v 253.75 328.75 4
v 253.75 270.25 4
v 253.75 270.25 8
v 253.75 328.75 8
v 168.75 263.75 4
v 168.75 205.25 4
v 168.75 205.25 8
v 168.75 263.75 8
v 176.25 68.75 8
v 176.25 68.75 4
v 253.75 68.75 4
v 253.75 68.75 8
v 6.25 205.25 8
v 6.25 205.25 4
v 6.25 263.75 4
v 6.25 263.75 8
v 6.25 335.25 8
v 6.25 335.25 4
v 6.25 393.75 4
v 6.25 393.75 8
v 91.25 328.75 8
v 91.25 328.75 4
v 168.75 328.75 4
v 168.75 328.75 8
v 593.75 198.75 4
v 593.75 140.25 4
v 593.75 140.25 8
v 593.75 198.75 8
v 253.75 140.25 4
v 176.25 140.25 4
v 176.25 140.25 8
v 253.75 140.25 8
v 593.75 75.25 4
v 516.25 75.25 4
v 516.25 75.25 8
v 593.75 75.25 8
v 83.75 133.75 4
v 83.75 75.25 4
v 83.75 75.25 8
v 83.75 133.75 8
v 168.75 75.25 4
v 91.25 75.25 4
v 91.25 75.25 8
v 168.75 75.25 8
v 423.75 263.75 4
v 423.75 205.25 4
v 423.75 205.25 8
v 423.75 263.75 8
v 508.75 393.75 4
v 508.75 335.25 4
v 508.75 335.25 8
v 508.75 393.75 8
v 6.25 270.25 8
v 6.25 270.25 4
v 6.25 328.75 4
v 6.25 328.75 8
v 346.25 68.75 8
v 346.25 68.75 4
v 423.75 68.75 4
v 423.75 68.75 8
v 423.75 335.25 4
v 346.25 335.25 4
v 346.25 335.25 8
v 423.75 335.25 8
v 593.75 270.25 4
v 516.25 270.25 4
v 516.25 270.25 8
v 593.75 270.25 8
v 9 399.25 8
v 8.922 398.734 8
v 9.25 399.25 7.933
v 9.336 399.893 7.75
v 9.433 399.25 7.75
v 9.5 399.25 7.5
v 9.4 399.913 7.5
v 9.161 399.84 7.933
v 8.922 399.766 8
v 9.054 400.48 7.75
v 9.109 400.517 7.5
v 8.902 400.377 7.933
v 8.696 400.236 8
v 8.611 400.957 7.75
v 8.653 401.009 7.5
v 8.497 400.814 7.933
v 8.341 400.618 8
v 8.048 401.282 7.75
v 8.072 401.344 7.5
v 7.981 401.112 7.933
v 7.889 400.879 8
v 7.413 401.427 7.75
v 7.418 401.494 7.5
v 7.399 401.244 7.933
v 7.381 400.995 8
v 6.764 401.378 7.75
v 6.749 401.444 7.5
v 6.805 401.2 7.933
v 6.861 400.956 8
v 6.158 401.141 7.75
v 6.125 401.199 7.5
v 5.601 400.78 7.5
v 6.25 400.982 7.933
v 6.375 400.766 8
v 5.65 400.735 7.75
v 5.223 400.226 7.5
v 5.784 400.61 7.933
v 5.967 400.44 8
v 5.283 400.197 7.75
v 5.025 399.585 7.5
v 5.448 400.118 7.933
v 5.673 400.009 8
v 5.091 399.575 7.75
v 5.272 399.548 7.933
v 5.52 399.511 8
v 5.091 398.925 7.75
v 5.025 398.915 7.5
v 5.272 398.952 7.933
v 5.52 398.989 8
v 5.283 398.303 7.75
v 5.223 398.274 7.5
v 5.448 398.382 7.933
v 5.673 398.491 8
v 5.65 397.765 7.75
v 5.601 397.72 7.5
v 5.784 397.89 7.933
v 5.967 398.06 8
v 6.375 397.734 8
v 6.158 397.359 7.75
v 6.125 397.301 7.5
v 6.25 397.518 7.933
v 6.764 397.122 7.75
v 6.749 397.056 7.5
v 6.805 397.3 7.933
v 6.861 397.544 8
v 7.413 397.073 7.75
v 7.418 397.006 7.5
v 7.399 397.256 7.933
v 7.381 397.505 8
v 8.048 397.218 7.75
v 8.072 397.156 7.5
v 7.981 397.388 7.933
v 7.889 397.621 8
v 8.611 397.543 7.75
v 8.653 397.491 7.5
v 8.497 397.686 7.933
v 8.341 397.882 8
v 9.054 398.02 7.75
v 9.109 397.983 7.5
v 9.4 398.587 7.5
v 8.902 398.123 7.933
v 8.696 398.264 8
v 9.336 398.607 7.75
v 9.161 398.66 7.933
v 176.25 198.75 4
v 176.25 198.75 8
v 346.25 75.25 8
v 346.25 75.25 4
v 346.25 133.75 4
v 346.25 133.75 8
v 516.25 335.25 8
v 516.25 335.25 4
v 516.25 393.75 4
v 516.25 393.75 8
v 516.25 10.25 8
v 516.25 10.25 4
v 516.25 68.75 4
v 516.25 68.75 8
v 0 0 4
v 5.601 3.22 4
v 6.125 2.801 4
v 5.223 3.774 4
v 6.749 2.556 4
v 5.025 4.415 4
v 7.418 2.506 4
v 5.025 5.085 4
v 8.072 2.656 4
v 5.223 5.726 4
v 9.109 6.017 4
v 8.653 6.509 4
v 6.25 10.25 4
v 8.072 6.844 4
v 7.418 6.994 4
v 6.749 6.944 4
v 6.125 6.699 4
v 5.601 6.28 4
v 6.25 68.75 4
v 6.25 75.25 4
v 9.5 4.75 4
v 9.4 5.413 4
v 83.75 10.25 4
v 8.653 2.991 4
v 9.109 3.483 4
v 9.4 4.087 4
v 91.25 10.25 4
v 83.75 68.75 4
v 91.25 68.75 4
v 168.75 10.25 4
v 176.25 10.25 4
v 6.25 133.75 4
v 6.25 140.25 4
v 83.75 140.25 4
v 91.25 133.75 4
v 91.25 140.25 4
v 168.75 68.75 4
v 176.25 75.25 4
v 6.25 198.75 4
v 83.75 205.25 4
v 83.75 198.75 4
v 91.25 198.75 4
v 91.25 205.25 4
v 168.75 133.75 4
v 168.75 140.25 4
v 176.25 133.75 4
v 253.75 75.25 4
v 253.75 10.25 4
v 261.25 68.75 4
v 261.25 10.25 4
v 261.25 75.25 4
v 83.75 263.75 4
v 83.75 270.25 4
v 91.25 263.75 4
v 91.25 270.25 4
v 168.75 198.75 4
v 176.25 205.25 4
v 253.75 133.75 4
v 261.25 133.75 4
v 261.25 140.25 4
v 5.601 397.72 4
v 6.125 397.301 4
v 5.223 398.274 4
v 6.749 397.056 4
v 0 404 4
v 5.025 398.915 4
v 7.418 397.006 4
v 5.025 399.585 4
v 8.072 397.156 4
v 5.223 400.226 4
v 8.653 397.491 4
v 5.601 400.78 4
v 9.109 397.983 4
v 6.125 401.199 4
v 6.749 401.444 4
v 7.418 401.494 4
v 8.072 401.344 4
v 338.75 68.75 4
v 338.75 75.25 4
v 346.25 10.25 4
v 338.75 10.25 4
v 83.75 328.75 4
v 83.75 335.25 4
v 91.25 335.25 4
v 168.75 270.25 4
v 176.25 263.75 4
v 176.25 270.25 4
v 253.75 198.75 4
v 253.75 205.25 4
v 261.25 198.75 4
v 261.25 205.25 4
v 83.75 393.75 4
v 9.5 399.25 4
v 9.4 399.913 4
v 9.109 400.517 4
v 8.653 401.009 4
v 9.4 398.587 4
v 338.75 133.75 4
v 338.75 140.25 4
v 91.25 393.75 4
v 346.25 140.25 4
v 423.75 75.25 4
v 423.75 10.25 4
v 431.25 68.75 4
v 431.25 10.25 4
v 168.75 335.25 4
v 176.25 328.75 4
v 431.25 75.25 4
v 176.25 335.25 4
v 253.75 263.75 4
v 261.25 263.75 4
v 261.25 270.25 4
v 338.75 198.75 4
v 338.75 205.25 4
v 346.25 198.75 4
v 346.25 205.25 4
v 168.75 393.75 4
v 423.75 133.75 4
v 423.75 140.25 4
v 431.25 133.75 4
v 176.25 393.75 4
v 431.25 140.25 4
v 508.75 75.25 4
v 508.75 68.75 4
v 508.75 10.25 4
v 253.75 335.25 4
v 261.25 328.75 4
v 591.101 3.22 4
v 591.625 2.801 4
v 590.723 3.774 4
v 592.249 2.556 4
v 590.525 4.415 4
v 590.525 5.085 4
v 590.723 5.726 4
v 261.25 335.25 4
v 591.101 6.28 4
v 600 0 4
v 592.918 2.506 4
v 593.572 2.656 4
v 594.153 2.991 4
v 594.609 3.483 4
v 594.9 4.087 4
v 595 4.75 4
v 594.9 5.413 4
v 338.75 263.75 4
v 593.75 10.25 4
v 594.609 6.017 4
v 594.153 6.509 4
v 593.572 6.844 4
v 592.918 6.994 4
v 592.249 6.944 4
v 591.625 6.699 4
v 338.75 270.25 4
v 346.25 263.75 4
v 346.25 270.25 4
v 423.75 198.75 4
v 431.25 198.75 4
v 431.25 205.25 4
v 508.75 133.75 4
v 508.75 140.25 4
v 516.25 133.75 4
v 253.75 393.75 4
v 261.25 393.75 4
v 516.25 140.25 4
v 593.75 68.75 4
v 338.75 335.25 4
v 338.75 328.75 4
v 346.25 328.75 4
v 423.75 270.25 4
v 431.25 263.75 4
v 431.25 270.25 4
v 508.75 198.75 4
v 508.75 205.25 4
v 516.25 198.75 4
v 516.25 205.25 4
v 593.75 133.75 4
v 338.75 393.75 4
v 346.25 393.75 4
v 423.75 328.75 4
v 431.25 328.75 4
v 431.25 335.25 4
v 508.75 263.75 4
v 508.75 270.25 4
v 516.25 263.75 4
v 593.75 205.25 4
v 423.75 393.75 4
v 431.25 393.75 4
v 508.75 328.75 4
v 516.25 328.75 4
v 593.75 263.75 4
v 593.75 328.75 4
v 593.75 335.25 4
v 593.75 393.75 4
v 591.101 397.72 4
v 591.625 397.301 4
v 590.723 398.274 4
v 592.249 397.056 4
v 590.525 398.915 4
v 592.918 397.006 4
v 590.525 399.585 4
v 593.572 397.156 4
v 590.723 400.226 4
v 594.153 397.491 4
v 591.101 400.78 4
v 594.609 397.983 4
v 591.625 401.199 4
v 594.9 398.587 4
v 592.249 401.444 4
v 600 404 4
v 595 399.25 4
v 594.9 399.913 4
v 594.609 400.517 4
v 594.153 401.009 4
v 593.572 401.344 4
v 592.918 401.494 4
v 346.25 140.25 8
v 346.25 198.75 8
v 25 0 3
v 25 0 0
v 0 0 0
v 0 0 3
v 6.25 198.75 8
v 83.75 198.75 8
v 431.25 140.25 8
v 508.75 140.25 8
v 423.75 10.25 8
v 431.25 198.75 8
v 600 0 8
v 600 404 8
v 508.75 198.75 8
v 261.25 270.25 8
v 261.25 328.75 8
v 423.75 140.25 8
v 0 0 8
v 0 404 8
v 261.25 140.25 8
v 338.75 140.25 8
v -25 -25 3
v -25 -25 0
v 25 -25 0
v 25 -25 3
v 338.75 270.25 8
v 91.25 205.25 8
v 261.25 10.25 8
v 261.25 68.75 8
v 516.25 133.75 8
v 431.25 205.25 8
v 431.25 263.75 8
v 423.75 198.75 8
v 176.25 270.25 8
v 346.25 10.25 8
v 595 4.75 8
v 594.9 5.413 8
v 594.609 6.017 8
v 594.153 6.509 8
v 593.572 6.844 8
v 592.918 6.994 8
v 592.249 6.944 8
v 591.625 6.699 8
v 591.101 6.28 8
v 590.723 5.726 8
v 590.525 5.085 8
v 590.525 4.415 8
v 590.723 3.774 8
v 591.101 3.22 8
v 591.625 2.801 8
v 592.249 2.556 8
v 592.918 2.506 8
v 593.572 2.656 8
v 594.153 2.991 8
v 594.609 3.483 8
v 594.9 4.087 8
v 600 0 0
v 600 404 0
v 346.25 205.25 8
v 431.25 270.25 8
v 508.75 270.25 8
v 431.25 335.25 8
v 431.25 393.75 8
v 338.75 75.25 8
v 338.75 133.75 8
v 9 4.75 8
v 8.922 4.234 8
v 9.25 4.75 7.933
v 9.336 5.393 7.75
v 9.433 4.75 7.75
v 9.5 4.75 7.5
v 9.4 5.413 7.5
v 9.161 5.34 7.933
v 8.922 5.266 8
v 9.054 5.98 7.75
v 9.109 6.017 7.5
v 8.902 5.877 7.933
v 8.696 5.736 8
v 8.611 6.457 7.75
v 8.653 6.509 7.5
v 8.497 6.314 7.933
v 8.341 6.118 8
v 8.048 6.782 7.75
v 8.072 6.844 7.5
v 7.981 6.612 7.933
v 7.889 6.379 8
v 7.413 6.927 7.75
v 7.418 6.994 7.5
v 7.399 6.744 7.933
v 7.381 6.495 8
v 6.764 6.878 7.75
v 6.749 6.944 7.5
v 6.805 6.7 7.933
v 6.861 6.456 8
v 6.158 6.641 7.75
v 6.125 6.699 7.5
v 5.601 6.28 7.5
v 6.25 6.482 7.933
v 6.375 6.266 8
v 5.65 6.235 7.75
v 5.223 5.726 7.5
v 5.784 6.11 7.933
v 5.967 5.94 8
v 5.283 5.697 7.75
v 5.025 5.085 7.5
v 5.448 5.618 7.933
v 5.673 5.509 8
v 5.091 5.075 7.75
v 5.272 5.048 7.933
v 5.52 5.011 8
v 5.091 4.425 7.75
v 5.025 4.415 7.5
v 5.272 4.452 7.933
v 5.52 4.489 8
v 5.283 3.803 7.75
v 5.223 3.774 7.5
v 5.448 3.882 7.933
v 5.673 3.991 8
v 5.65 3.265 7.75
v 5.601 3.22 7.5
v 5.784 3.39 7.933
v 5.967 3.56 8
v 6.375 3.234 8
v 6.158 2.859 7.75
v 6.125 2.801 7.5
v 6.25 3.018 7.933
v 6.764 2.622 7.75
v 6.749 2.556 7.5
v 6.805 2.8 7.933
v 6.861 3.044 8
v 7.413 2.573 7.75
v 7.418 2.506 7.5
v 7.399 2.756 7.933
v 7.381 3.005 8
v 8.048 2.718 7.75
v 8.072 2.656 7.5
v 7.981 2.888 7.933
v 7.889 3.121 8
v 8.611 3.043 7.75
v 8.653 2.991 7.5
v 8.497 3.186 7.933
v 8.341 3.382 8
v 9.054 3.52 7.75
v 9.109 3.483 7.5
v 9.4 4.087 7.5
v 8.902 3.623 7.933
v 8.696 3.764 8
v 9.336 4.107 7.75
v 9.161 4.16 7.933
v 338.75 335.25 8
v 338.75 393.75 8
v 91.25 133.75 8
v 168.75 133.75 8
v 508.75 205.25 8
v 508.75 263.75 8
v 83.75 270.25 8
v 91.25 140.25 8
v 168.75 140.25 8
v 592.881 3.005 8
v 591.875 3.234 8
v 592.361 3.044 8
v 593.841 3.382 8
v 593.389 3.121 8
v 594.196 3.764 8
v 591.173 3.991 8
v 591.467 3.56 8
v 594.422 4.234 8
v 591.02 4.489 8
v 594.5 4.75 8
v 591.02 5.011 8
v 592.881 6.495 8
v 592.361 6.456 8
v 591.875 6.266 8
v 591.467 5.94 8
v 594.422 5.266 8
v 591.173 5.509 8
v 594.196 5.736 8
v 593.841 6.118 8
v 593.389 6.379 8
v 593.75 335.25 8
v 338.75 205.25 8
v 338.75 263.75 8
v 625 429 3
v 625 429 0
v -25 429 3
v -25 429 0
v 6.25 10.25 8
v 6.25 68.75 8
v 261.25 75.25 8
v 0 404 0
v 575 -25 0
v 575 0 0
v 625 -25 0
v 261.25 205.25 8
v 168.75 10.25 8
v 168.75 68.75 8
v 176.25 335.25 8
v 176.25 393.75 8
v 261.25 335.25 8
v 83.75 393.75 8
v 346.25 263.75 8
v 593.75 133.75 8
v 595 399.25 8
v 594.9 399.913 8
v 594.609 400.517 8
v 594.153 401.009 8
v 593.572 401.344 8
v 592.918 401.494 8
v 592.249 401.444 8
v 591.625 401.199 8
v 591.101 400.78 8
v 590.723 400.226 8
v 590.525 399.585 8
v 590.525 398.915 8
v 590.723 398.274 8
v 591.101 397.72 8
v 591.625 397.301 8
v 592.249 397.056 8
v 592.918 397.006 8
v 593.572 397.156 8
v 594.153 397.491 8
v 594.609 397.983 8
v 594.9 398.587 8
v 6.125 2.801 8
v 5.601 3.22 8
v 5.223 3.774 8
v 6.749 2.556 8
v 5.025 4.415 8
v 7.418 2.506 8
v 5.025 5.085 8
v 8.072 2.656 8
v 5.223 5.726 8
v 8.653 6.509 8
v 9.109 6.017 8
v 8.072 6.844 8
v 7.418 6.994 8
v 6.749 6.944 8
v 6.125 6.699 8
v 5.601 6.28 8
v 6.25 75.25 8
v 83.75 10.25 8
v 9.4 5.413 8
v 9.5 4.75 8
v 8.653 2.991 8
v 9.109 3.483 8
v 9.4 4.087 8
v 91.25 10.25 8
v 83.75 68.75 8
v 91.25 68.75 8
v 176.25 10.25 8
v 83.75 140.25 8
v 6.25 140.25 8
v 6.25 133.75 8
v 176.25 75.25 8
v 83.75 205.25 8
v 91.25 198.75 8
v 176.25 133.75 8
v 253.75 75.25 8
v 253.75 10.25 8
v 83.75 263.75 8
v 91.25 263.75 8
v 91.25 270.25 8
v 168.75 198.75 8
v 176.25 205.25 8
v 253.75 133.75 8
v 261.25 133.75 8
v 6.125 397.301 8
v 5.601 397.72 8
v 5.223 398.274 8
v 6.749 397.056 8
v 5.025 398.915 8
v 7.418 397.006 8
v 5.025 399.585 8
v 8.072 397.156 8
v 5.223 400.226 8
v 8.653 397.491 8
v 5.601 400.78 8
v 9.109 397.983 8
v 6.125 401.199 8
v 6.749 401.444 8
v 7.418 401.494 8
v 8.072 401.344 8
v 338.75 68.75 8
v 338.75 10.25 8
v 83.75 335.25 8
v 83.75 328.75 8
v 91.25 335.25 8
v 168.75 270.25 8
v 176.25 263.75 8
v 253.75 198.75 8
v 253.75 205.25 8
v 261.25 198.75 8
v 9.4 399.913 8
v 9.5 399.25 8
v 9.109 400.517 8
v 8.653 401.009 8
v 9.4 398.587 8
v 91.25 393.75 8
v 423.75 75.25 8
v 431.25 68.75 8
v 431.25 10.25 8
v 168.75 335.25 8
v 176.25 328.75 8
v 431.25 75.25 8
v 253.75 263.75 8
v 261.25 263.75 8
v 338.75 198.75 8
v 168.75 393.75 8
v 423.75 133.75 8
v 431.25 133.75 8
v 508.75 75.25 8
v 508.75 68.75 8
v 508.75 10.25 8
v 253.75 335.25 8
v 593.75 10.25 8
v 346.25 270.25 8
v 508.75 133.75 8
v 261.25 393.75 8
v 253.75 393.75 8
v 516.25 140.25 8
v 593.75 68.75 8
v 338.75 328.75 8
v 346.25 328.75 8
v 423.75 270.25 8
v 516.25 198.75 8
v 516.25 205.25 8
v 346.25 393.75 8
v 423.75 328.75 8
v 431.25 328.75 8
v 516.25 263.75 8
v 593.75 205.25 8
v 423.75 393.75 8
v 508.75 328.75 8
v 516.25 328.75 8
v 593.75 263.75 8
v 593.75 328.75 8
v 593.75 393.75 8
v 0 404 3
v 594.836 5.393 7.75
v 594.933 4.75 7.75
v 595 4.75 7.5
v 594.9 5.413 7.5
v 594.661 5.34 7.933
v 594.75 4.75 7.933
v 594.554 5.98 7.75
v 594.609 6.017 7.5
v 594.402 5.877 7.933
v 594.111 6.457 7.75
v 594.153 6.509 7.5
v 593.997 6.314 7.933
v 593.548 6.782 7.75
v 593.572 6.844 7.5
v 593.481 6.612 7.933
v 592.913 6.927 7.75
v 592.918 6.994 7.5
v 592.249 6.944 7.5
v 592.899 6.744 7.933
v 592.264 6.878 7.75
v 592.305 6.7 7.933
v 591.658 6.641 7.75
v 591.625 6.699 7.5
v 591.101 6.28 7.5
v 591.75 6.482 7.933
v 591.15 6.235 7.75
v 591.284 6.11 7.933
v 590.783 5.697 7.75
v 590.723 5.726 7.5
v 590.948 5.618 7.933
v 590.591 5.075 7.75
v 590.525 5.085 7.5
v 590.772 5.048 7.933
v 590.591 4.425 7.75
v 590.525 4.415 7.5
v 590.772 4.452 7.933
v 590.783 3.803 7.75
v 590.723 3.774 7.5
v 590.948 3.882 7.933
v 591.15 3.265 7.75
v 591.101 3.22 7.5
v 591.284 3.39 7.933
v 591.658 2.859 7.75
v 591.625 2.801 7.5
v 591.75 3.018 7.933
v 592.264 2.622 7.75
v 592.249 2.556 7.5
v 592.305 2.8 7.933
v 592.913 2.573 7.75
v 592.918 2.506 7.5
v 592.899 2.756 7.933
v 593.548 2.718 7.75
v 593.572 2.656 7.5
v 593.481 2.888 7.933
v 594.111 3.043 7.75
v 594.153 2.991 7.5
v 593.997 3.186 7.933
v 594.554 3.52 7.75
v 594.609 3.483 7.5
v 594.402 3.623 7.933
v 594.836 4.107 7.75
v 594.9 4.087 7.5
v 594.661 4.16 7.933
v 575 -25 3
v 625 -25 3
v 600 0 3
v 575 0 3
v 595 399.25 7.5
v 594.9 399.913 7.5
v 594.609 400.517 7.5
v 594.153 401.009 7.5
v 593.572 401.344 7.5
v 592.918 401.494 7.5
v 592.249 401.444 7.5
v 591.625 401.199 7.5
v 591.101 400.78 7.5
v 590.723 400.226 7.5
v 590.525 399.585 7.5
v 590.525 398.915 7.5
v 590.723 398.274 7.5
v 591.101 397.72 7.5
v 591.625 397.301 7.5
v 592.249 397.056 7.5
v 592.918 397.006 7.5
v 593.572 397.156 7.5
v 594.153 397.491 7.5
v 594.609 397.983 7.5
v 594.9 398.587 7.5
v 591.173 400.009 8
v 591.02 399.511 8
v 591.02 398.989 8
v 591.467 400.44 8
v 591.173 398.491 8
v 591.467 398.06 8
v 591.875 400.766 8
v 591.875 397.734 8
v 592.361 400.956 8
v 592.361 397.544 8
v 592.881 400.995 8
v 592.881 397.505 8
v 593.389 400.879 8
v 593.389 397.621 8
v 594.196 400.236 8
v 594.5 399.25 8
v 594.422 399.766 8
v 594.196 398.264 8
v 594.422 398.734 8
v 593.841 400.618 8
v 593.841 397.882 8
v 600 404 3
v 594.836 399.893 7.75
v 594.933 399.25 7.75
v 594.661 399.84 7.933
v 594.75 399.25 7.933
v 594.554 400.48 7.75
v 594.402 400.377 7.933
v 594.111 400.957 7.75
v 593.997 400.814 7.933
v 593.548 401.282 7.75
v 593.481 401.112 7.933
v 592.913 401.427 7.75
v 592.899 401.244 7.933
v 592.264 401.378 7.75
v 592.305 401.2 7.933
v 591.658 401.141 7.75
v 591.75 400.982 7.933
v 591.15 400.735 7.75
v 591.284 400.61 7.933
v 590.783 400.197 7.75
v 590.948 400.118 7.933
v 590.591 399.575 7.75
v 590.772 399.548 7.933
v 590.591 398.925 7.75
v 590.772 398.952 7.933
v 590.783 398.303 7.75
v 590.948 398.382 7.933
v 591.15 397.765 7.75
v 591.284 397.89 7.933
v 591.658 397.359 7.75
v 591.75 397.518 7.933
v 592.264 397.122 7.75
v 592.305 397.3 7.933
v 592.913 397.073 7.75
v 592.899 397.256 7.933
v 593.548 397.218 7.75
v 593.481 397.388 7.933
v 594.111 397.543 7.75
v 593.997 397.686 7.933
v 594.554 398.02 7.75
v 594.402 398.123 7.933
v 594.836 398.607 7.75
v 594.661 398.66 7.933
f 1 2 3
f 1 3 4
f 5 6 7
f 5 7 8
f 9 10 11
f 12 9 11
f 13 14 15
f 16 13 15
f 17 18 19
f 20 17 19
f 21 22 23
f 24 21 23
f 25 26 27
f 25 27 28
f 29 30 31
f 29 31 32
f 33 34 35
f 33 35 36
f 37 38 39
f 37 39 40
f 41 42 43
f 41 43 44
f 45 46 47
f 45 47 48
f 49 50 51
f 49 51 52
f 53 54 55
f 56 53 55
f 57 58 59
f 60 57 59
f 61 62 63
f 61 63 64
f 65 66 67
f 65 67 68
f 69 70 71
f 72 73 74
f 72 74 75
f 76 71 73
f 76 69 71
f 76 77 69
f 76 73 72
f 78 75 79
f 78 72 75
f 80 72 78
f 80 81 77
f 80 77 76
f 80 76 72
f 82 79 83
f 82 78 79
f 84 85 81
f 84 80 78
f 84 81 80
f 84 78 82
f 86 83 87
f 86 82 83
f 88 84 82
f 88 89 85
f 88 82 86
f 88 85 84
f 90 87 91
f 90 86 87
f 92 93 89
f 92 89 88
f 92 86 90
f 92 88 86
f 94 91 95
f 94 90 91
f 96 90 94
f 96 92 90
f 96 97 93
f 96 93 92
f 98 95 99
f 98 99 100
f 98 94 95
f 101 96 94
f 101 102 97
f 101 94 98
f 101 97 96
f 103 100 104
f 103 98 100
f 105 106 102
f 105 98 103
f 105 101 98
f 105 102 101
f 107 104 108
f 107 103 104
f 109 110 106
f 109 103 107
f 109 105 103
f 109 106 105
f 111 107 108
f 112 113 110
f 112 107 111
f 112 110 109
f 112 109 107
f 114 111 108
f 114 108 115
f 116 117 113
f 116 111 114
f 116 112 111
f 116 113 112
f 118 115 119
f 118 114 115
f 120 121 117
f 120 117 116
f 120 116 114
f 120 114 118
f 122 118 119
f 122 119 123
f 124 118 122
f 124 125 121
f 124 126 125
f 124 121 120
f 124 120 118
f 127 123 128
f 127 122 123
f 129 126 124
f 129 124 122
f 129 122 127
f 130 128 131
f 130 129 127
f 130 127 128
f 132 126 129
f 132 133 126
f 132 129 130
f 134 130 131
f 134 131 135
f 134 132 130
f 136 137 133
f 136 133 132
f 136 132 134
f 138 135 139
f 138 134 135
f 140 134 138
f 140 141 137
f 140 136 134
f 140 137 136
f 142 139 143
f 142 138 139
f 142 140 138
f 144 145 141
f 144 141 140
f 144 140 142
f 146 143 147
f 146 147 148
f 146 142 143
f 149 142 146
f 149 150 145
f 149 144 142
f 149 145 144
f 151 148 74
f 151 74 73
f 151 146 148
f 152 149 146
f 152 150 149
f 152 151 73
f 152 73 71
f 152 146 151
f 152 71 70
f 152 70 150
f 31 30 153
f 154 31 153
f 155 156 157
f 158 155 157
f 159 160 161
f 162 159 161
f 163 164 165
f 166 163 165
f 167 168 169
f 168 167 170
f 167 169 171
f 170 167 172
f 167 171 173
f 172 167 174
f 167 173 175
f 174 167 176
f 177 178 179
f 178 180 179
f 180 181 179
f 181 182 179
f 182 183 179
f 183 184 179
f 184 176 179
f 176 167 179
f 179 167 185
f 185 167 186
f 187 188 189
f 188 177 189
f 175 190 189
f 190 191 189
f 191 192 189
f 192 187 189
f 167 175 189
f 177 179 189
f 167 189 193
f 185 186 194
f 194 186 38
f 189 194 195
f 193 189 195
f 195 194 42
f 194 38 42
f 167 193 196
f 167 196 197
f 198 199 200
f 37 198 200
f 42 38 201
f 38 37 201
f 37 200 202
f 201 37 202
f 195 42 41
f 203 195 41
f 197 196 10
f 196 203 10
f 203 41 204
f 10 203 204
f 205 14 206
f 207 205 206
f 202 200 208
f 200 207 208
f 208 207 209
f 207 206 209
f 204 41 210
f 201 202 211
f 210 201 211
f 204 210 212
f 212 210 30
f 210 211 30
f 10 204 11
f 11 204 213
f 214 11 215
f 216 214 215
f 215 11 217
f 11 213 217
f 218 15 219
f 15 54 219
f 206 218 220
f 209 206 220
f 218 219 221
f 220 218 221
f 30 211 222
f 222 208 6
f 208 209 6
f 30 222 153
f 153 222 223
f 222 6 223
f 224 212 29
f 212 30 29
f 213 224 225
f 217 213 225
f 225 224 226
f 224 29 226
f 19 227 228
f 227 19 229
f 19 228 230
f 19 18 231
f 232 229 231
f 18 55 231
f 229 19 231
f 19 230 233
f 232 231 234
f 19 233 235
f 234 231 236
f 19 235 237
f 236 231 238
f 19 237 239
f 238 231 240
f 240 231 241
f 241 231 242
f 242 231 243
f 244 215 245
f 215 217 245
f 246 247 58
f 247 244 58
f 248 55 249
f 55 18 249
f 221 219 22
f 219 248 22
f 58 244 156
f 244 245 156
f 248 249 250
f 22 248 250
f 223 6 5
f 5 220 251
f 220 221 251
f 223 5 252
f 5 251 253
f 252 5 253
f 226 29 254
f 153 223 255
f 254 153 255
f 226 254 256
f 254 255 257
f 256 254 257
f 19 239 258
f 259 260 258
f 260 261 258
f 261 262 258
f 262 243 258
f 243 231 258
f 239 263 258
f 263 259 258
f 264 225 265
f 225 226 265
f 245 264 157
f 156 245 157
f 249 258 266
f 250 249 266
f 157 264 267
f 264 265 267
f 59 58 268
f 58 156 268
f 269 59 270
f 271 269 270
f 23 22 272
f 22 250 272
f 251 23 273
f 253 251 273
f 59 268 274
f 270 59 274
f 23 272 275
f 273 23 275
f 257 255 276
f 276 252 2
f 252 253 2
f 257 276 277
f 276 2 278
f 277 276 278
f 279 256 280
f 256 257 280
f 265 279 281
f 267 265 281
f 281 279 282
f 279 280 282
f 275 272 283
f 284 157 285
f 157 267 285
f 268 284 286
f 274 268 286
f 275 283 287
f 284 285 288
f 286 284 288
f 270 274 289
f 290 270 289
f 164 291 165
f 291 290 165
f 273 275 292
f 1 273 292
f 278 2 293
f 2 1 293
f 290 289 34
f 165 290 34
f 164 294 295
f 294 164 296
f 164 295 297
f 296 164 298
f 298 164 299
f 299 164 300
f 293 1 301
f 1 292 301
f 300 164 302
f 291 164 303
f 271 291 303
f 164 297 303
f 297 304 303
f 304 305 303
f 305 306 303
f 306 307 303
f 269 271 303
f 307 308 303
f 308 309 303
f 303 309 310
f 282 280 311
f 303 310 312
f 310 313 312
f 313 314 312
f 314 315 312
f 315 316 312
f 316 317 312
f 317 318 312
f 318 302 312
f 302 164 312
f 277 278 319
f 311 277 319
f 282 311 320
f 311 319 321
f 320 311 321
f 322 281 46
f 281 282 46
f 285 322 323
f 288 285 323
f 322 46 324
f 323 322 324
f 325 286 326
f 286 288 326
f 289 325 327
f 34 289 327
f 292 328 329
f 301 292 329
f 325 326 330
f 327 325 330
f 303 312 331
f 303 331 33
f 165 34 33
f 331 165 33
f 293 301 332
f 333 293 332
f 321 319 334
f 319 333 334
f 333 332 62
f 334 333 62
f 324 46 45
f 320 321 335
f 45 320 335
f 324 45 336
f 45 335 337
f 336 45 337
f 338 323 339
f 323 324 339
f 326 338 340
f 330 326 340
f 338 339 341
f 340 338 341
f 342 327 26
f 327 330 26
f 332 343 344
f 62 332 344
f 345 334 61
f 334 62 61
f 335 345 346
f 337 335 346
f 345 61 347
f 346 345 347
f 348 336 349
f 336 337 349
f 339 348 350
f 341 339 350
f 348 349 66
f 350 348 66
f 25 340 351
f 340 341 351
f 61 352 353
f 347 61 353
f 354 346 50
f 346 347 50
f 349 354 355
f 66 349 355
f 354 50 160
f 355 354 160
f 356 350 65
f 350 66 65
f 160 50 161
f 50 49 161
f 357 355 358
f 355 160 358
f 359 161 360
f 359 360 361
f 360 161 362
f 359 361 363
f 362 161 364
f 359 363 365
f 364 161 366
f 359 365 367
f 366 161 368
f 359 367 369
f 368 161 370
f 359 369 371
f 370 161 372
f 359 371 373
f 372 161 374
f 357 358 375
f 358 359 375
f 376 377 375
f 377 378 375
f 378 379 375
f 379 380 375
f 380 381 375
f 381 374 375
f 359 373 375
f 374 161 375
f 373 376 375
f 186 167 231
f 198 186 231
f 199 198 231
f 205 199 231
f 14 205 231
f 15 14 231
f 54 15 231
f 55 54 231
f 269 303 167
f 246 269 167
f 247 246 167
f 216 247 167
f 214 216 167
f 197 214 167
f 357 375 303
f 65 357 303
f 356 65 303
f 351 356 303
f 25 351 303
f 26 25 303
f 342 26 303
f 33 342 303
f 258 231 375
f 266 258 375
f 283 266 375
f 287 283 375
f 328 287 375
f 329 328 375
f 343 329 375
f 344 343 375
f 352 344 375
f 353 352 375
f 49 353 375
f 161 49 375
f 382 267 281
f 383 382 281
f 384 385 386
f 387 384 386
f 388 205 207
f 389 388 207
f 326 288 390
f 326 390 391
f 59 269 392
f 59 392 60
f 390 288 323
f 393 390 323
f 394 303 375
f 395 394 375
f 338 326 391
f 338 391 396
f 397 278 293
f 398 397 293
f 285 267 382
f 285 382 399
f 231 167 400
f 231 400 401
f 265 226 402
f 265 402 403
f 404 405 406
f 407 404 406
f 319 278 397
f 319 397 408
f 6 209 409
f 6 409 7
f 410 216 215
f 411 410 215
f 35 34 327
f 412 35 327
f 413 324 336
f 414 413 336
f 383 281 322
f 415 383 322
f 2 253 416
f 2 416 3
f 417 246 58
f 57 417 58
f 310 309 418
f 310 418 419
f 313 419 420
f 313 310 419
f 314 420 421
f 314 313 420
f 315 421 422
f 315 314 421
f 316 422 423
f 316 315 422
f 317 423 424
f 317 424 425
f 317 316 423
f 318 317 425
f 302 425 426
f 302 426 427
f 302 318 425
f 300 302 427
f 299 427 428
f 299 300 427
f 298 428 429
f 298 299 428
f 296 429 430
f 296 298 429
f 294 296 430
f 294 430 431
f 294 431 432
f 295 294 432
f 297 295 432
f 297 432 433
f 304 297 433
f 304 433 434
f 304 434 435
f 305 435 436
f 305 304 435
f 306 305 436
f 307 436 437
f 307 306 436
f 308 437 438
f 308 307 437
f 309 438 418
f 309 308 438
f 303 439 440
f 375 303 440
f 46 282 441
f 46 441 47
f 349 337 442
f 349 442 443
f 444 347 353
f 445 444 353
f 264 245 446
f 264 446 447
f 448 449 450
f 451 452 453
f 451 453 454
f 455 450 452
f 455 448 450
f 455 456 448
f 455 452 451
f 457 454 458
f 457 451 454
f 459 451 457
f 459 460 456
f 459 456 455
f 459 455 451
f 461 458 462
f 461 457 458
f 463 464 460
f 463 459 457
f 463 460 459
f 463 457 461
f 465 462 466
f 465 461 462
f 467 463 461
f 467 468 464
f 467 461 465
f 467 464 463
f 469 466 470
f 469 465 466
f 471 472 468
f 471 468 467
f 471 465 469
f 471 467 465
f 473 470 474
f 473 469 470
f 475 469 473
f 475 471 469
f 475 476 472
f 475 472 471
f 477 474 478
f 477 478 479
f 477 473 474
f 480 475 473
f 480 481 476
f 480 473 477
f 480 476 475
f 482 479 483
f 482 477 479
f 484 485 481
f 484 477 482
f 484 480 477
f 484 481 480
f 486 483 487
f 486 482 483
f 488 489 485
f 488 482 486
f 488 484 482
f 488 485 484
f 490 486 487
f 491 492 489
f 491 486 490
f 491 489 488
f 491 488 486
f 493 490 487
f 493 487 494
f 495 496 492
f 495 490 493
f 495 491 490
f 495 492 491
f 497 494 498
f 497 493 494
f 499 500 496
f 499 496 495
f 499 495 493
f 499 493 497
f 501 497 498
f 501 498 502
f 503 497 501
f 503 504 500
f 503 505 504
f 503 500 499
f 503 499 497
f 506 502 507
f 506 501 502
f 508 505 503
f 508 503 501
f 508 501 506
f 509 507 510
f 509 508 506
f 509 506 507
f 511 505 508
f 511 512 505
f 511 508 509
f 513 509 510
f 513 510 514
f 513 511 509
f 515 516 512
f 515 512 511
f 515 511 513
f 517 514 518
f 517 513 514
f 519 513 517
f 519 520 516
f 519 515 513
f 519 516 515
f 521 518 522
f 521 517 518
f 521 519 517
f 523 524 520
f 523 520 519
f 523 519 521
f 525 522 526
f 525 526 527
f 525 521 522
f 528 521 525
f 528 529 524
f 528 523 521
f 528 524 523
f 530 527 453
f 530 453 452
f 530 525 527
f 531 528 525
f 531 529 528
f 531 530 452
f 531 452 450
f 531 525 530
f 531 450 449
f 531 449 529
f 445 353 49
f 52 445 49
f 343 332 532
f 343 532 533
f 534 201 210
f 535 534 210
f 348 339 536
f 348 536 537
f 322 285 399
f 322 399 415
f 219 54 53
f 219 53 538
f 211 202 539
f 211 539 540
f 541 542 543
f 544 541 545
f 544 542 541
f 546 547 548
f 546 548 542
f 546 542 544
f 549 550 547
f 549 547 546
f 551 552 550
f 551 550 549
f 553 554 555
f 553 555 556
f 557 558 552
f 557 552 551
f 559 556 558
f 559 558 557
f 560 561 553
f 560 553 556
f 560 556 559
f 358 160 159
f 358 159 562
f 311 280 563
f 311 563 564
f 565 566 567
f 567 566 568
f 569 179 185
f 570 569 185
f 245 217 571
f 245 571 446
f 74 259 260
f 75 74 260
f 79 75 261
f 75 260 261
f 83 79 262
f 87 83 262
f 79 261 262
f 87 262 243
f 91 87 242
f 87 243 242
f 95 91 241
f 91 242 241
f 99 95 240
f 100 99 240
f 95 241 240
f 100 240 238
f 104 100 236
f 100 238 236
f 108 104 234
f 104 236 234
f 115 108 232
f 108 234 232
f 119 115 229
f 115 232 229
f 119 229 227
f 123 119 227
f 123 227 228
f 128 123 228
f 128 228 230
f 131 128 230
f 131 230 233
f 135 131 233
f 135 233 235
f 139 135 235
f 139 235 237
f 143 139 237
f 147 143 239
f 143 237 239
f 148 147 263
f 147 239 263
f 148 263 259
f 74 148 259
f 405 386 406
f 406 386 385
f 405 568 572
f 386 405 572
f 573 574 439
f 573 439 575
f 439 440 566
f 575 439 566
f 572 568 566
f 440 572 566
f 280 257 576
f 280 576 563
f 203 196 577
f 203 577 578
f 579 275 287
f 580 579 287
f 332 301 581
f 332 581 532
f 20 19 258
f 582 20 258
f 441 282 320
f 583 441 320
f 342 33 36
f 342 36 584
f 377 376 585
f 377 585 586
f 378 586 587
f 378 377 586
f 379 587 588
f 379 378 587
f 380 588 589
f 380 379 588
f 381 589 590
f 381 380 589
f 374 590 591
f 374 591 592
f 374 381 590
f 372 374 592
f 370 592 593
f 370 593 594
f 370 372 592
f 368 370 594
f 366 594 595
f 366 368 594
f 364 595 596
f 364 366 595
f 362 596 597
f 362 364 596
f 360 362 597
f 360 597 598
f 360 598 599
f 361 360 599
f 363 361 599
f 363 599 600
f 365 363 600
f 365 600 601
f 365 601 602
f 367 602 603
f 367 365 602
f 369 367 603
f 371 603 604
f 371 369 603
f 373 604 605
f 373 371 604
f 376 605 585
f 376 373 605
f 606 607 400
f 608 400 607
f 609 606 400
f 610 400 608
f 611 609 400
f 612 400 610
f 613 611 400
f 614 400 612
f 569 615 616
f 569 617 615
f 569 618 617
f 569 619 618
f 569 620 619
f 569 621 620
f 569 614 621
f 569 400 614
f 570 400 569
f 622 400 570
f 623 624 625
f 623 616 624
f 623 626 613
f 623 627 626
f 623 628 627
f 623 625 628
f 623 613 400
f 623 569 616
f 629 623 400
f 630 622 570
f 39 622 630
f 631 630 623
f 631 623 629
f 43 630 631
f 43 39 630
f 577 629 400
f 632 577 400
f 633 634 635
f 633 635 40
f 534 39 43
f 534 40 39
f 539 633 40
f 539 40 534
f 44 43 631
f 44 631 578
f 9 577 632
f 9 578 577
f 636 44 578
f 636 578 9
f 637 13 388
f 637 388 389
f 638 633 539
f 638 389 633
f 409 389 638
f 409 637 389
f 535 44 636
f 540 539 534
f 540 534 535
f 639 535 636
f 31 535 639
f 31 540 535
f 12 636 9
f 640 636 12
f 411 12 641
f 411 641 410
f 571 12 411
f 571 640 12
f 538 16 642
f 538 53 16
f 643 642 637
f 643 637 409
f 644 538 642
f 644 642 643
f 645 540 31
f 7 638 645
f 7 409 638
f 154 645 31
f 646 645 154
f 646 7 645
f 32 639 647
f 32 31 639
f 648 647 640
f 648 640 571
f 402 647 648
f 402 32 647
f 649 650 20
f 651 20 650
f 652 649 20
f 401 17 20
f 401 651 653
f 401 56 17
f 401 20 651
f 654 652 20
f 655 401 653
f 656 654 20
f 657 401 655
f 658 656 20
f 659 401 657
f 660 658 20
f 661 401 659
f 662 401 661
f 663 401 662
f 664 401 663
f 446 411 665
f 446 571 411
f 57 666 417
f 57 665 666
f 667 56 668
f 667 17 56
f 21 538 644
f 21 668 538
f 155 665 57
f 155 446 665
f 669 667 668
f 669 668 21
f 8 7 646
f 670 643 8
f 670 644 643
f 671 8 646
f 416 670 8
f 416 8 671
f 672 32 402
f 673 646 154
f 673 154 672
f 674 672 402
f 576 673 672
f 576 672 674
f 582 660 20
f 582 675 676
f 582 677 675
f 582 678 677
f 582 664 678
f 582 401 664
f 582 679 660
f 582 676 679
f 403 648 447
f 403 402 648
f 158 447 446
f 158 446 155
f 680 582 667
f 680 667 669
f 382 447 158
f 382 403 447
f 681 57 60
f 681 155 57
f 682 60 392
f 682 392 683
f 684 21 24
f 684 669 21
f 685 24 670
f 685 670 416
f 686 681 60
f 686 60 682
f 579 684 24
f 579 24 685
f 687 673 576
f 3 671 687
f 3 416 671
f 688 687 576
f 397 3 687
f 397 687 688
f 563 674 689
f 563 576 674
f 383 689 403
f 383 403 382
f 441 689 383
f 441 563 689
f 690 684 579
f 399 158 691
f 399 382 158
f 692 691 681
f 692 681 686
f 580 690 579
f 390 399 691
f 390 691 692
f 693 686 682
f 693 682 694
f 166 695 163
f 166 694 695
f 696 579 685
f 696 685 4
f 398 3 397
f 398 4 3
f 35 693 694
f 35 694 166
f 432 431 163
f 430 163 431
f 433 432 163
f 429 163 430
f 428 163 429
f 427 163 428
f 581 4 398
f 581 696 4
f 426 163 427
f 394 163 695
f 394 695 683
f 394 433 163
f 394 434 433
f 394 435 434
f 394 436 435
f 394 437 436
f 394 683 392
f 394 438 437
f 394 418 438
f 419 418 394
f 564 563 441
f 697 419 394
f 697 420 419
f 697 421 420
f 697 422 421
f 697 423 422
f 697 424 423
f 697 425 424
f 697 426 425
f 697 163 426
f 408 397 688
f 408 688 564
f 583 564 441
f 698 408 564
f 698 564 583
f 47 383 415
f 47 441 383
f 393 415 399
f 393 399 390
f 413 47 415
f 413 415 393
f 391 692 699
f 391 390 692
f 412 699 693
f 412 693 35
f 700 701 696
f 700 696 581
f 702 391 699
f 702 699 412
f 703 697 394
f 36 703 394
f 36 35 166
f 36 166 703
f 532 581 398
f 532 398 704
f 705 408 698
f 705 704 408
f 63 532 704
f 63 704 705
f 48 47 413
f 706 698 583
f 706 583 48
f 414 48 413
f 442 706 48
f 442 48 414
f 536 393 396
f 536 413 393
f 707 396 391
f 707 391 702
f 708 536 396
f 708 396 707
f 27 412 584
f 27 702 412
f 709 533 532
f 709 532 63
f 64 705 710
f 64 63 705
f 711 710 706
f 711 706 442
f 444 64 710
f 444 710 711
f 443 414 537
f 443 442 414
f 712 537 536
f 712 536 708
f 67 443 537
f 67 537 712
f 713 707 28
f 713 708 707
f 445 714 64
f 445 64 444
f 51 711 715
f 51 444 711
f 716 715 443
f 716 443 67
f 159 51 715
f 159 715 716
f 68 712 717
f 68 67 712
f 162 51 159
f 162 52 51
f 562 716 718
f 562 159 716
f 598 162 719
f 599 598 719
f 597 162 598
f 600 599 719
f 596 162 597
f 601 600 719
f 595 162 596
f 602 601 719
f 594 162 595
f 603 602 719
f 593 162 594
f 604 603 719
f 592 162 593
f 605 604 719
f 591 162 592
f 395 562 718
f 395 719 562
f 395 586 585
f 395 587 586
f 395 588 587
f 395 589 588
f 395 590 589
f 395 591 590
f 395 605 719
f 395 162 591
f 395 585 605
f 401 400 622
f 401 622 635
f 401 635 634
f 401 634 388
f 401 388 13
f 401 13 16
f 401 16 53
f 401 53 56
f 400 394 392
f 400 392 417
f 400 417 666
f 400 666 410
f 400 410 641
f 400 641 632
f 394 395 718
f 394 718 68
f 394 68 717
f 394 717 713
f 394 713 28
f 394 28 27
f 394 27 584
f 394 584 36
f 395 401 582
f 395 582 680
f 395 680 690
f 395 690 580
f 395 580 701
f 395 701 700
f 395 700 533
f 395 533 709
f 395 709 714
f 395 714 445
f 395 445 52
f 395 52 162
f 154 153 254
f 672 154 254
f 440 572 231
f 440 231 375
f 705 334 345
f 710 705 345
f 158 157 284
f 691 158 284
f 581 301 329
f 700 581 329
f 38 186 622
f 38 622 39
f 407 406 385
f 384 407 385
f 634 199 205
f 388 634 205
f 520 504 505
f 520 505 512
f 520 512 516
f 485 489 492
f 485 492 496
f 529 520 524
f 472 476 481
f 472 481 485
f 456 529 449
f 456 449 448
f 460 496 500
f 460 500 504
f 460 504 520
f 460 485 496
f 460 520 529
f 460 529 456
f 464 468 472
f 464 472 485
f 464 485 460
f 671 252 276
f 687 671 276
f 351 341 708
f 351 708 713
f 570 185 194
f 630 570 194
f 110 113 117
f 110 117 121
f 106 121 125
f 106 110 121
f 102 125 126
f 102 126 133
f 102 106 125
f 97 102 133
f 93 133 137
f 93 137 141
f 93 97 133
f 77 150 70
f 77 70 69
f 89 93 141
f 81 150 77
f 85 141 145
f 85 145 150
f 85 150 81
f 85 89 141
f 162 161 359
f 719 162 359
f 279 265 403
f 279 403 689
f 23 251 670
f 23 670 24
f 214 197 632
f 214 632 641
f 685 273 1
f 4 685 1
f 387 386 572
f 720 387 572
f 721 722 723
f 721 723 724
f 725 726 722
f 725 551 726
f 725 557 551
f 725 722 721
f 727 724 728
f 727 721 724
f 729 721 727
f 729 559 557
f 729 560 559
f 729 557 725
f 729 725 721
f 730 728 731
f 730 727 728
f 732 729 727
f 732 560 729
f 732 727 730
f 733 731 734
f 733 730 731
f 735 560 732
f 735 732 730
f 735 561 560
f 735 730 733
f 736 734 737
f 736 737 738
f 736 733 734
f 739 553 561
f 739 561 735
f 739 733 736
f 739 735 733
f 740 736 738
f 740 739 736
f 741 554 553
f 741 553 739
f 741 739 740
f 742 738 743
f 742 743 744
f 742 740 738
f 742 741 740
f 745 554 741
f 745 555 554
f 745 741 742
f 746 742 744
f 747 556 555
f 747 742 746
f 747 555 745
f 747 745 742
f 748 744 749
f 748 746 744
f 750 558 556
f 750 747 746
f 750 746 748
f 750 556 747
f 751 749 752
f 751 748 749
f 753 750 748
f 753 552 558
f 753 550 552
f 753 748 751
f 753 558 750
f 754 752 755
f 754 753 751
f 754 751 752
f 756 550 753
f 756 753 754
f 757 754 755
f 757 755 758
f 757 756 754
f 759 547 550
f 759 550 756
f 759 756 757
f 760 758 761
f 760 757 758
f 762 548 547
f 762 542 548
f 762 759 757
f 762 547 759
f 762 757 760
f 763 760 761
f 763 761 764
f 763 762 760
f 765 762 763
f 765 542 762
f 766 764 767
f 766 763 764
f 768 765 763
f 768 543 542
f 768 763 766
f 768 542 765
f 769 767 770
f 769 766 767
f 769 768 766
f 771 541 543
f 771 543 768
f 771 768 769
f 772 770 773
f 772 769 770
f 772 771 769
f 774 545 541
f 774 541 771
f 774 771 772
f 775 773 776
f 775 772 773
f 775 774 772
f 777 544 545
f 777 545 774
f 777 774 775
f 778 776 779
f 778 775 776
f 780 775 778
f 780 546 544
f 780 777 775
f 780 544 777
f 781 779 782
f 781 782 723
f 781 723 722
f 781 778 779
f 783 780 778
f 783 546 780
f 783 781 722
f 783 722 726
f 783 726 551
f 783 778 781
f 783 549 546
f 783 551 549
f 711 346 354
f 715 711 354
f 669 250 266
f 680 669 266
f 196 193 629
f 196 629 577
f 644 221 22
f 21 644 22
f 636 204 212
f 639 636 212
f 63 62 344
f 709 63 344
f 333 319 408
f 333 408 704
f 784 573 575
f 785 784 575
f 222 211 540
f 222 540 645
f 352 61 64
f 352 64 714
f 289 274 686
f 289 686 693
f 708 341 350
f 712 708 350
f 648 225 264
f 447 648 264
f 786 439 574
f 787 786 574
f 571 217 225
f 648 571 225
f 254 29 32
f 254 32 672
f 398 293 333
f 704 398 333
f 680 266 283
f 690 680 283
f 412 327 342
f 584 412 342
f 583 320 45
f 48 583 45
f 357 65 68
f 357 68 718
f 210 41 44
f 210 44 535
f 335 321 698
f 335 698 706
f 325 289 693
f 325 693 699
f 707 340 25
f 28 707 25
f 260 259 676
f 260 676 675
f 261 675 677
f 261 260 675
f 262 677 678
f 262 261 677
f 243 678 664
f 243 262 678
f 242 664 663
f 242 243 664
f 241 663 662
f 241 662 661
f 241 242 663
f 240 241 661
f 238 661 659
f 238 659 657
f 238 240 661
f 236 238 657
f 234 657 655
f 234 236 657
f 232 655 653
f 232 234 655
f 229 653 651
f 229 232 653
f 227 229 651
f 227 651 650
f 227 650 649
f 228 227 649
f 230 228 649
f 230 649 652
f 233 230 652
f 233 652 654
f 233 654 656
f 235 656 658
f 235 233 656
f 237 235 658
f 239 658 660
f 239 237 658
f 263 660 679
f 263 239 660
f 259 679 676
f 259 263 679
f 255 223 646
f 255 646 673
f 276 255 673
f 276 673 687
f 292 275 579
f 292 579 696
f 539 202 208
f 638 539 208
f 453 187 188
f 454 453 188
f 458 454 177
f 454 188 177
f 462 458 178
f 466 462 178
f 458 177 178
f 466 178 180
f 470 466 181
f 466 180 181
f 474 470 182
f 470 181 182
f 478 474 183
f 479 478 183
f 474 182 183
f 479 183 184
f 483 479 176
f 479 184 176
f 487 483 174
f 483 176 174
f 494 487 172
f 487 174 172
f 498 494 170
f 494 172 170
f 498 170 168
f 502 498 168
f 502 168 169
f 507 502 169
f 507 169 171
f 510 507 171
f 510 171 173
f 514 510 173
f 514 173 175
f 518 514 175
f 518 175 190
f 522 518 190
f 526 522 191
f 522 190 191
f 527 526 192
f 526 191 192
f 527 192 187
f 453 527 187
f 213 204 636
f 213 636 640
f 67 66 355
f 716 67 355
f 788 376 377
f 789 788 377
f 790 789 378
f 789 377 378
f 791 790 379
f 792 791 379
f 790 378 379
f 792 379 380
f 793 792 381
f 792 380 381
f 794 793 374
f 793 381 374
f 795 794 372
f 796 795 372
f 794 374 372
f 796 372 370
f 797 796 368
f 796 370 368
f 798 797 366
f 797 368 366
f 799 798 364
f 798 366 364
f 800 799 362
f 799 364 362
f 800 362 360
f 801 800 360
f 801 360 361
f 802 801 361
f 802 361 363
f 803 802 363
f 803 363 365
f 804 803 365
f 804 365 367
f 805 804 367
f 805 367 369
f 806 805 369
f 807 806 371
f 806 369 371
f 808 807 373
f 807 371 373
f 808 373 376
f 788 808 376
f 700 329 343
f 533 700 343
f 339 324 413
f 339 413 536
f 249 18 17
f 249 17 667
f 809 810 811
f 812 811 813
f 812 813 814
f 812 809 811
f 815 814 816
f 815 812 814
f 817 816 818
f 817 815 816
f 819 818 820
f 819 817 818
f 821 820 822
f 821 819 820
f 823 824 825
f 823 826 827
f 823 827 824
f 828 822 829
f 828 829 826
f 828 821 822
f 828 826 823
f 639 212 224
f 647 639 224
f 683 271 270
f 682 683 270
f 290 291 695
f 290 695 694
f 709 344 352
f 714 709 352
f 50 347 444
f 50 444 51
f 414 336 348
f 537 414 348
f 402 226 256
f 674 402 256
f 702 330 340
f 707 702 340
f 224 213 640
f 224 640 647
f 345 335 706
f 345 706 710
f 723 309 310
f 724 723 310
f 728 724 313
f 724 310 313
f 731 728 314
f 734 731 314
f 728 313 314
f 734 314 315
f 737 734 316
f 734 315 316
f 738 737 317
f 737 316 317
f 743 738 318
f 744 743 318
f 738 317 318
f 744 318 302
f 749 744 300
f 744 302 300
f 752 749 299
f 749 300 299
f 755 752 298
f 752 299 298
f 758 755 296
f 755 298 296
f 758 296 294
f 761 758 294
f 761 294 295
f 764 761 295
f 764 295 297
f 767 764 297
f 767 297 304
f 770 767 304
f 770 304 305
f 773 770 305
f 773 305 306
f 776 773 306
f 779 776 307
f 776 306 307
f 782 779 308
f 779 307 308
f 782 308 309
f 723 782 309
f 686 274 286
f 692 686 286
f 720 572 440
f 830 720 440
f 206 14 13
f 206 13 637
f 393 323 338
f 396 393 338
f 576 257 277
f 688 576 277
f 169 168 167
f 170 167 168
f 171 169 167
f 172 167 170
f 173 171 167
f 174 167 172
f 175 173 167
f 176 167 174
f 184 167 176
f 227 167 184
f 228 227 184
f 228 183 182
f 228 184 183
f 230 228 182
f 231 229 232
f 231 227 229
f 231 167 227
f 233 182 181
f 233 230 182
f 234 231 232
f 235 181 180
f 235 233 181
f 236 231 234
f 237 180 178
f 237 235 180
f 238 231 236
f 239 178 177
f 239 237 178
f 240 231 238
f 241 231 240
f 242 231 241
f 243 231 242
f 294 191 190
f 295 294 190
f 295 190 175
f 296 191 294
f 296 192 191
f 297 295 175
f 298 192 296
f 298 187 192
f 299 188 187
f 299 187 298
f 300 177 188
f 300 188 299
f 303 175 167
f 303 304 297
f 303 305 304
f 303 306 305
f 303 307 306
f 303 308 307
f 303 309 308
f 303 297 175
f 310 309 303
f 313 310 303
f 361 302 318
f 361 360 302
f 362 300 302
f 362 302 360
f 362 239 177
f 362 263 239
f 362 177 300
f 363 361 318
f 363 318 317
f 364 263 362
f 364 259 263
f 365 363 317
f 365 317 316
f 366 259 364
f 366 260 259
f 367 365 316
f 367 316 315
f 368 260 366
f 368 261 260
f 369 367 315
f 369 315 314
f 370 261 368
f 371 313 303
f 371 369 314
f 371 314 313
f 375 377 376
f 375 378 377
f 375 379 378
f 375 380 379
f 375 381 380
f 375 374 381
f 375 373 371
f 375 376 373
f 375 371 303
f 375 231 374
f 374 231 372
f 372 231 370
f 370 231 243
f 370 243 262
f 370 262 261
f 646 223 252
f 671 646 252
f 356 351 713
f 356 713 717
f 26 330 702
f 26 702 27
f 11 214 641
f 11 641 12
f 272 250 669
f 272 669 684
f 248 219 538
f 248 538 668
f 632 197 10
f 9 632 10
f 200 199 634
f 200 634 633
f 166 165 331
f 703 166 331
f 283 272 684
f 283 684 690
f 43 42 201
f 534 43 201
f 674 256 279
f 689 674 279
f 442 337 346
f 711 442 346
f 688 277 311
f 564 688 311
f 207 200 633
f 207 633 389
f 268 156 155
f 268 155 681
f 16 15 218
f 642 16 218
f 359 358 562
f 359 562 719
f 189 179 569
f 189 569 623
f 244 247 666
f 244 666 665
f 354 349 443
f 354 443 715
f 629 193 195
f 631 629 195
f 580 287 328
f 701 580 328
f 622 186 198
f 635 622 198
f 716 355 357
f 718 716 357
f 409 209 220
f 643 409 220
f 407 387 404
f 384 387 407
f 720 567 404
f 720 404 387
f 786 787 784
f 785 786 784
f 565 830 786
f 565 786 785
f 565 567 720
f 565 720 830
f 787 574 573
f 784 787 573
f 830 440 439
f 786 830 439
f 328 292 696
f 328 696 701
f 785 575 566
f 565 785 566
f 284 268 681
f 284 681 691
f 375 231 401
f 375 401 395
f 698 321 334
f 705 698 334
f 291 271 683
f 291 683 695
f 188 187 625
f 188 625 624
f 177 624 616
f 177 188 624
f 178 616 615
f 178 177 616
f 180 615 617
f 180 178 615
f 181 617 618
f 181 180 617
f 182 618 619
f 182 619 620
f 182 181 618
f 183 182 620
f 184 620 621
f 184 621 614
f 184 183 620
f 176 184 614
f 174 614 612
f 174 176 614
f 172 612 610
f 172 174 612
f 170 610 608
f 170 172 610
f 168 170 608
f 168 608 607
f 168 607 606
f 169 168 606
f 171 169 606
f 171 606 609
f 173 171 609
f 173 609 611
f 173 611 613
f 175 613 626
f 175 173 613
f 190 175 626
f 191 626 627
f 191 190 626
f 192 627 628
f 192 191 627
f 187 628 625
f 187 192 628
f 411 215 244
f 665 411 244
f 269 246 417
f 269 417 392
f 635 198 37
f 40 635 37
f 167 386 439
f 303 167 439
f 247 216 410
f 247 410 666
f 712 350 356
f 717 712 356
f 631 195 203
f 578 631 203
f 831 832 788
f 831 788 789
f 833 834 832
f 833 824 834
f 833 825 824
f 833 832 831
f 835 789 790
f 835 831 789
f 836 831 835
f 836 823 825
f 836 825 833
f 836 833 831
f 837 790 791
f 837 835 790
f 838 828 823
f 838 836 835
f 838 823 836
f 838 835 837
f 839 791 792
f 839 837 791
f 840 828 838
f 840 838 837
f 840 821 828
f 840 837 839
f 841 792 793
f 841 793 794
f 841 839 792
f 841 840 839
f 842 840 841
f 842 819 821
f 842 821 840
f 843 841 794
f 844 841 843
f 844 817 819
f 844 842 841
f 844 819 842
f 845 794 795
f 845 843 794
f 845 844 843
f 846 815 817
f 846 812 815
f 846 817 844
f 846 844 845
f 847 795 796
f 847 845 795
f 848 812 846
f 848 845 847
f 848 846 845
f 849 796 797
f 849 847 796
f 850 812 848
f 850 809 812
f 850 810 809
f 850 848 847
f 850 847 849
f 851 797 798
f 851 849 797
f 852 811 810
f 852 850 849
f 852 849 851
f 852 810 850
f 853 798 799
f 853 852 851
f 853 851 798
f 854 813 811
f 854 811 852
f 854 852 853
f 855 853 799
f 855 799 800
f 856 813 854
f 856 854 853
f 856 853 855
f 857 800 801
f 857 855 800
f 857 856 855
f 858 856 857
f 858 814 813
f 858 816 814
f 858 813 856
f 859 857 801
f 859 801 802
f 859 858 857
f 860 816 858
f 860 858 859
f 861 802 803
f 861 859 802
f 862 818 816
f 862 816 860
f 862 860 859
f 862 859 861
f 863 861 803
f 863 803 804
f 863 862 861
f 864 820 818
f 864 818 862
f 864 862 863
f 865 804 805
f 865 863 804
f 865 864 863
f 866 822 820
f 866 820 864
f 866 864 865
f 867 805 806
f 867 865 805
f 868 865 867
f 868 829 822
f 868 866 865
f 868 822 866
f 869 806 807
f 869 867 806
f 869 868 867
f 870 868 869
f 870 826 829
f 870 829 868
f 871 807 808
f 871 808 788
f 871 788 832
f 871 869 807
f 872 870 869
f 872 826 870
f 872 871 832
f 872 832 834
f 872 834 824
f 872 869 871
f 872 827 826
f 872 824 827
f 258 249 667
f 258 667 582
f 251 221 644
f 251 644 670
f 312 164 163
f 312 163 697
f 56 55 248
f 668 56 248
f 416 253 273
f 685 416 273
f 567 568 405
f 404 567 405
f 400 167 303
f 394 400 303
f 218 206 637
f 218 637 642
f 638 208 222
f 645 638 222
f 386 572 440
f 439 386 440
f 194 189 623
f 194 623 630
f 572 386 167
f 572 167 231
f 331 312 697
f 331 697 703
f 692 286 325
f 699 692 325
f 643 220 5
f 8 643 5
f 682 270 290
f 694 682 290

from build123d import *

# Parameters (mm, degrees)
F0_W     = 600
F0_H     = 404
F1_DEPTH = 4
F2_R     = 2.25
F3_DEPTH = 4
F4_R     = 0.5
F5_W     = 600
F5_H     = 404
F5_R     = 2.25
F5_W_2   = 77.5
F5_H_2   = 58.5
F6_DEPTH = 4
F8_DEPTH = 3


with BuildPart() as f1:
    # F0 (on Top) → F1 (new body)
    with BuildSketch(Plane.XY):
        with Locations((300, 202)):
            Rectangle(F0_W, F0_H)
    extrude(amount=F1_DEPTH)

    # F2 (on face) → F3 (join)
    with BuildSketch(Plane.XY.offset(4)):
        with Locations((7.25, 4.75)):
            Circle(F2_R)
        with Locations((7.25, 399.25)):
            Circle(F2_R)
        with Locations((592.75, 399.25)):
            Circle(F2_R)
        with Locations((592.75, 4.75)):
            Circle(F2_R)
    extrude(amount=F3_DEPTH)

    # F4
    f4_edges = [f1.edges().sort_by_distance(p)[0] for p in [
        (5, 399.25, 8),
        (5, 4.75, 8),
        (590.5, 4.75, 8),
        (590.5, 399.25, 8),
    ]]
    fillet(f4_edges, radius=F4_R)


with BuildPart() as f6:
    # F5 (on face) → F6 (new body)
    with BuildSketch(Plane.XY.offset(4)):
        with Locations((300, 202)):
            Rectangle(F5_W, F5_H)
        with Locations((7.25, 4.75)):
            Circle(F5_R, mode=Mode.SUBTRACT)
        with Locations((45, 39.5)):
            Rectangle(F5_W_2, F5_H_2, mode=Mode.SUBTRACT)
        with Locations((130, 39.5)):
            Rectangle(F5_W_2, F5_H_2, mode=Mode.SUBTRACT)
        with Locations((215, 39.5)):
            Rectangle(F5_W_2, F5_H_2, mode=Mode.SUBTRACT)
        with Locations((45, 104.5)):
            Rectangle(F5_W_2, F5_H_2, mode=Mode.SUBTRACT)
        with Locations((130, 104.5)):
            Rectangle(F5_W_2, F5_H_2, mode=Mode.SUBTRACT)
        with Locations((45, 169.5)):
            Rectangle(F5_W_2, F5_H_2, mode=Mode.SUBTRACT)
        with Locations((130, 169.5)):
            Rectangle(F5_W_2, F5_H_2, mode=Mode.SUBTRACT)
        with Locations((215, 104.5)):
            Rectangle(F5_W_2, F5_H_2, mode=Mode.SUBTRACT)
        with Locations((215, 169.5)):
            Rectangle(F5_W_2, F5_H_2, mode=Mode.SUBTRACT)
        with Locations((300, 39.5)):
            Rectangle(F5_W_2, F5_H_2, mode=Mode.SUBTRACT)
        with Locations((385, 39.5)):
            Rectangle(F5_W_2, F5_H_2, mode=Mode.SUBTRACT)
        with Locations((470, 39.5)):
            Rectangle(F5_W_2, F5_H_2, mode=Mode.SUBTRACT)
        with Locations((592.75, 4.75)):
            Circle(F5_R, mode=Mode.SUBTRACT)
        with Locations((555, 39.5)):
            Rectangle(F5_W_2, F5_H_2, mode=Mode.SUBTRACT)
        with Locations((300, 104.5)):
            Rectangle(F5_W_2, F5_H_2, mode=Mode.SUBTRACT)
        with Locations((385, 104.5)):
            Rectangle(F5_W_2, F5_H_2, mode=Mode.SUBTRACT)
        with Locations((300, 169.5)):
            Rectangle(F5_W_2, F5_H_2, mode=Mode.SUBTRACT)
        with Locations((385, 169.5)):
            Rectangle(F5_W_2, F5_H_2, mode=Mode.SUBTRACT)
        with Locations((470, 104.5)):
            Rectangle(F5_W_2, F5_H_2, mode=Mode.SUBTRACT)
        with Locations((555, 104.5)):
            Rectangle(F5_W_2, F5_H_2, mode=Mode.SUBTRACT)
        with Locations((470, 169.5)):
            Rectangle(F5_W_2, F5_H_2, mode=Mode.SUBTRACT)
        with Locations((555, 169.5)):
            Rectangle(F5_W_2, F5_H_2, mode=Mode.SUBTRACT)
        with Locations((45, 234.5)):
            Rectangle(F5_W_2, F5_H_2, mode=Mode.SUBTRACT)
        with Locations((130, 234.5)):
            Rectangle(F5_W_2, F5_H_2, mode=Mode.SUBTRACT)
        with Locations((45, 299.5)):
            Rectangle(F5_W_2, F5_H_2, mode=Mode.SUBTRACT)
        with Locations((130, 299.5)):
            Rectangle(F5_W_2, F5_H_2, mode=Mode.SUBTRACT)
        with Locations((215, 234.5)):
            Rectangle(F5_W_2, F5_H_2, mode=Mode.SUBTRACT)
        with Locations((215, 299.5)):
            Rectangle(F5_W_2, F5_H_2, mode=Mode.SUBTRACT)
        with Locations((45, 364.5)):
            Rectangle(F5_W_2, F5_H_2, mode=Mode.SUBTRACT)
        with Locations((7.25, 399.25)):
            Circle(F5_R, mode=Mode.SUBTRACT)
        with Locations((130, 364.5)):
            Rectangle(F5_W_2, F5_H_2, mode=Mode.SUBTRACT)
        with Locations((215, 364.5)):
            Rectangle(F5_W_2, F5_H_2, mode=Mode.SUBTRACT)
        with Locations((300, 234.5)):
            Rectangle(F5_W_2, F5_H_2, mode=Mode.SUBTRACT)
        with Locations((385, 234.5)):
            Rectangle(F5_W_2, F5_H_2, mode=Mode.SUBTRACT)
        with Locations((300, 299.5)):
            Rectangle(F5_W_2, F5_H_2, mode=Mode.SUBTRACT)
        with Locations((385, 299.5)):
            Rectangle(F5_W_2, F5_H_2, mode=Mode.SUBTRACT)
        with Locations((470, 234.5)):
            Rectangle(F5_W_2, F5_H_2, mode=Mode.SUBTRACT)
        with Locations((555, 234.5)):
            Rectangle(F5_W_2, F5_H_2, mode=Mode.SUBTRACT)
        with Locations((470, 299.5)):
            Rectangle(F5_W_2, F5_H_2, mode=Mode.SUBTRACT)
        with Locations((555, 299.5)):
            Rectangle(F5_W_2, F5_H_2, mode=Mode.SUBTRACT)
        with Locations((300, 364.5)):
            Rectangle(F5_W_2, F5_H_2, mode=Mode.SUBTRACT)
        with Locations((385, 364.5)):
            Rectangle(F5_W_2, F5_H_2, mode=Mode.SUBTRACT)
        with Locations((470, 364.5)):
            Rectangle(F5_W_2, F5_H_2, mode=Mode.SUBTRACT)
        with Locations((555, 364.5)):
            Rectangle(F5_W_2, F5_H_2, mode=Mode.SUBTRACT)
        with Locations((592.75, 399.25)):
            Circle(F5_R, mode=Mode.SUBTRACT)
    extrude(amount=F6_DEPTH)


with BuildPart() as f8:
    # F7 (on Top) → F8 (new body)
    with BuildSketch(Plane.XY):
        Polygon((0, 0), (0, 404), (600, 404), (600, 0), (625, 0), (625, 429), (-25, 429), (-25, 0), align=None)
        Polygon((25, 0), (0, 0), (-25, 0), (-25, -25), (25, -25), align=None)
        Polygon((625, 0), (600, 0), (575, 0), (575, -25), (625, -25), align=None)
    extrude(amount=F8_DEPTH)


solid = Compound([f1.part, f6.part, f8.part])
